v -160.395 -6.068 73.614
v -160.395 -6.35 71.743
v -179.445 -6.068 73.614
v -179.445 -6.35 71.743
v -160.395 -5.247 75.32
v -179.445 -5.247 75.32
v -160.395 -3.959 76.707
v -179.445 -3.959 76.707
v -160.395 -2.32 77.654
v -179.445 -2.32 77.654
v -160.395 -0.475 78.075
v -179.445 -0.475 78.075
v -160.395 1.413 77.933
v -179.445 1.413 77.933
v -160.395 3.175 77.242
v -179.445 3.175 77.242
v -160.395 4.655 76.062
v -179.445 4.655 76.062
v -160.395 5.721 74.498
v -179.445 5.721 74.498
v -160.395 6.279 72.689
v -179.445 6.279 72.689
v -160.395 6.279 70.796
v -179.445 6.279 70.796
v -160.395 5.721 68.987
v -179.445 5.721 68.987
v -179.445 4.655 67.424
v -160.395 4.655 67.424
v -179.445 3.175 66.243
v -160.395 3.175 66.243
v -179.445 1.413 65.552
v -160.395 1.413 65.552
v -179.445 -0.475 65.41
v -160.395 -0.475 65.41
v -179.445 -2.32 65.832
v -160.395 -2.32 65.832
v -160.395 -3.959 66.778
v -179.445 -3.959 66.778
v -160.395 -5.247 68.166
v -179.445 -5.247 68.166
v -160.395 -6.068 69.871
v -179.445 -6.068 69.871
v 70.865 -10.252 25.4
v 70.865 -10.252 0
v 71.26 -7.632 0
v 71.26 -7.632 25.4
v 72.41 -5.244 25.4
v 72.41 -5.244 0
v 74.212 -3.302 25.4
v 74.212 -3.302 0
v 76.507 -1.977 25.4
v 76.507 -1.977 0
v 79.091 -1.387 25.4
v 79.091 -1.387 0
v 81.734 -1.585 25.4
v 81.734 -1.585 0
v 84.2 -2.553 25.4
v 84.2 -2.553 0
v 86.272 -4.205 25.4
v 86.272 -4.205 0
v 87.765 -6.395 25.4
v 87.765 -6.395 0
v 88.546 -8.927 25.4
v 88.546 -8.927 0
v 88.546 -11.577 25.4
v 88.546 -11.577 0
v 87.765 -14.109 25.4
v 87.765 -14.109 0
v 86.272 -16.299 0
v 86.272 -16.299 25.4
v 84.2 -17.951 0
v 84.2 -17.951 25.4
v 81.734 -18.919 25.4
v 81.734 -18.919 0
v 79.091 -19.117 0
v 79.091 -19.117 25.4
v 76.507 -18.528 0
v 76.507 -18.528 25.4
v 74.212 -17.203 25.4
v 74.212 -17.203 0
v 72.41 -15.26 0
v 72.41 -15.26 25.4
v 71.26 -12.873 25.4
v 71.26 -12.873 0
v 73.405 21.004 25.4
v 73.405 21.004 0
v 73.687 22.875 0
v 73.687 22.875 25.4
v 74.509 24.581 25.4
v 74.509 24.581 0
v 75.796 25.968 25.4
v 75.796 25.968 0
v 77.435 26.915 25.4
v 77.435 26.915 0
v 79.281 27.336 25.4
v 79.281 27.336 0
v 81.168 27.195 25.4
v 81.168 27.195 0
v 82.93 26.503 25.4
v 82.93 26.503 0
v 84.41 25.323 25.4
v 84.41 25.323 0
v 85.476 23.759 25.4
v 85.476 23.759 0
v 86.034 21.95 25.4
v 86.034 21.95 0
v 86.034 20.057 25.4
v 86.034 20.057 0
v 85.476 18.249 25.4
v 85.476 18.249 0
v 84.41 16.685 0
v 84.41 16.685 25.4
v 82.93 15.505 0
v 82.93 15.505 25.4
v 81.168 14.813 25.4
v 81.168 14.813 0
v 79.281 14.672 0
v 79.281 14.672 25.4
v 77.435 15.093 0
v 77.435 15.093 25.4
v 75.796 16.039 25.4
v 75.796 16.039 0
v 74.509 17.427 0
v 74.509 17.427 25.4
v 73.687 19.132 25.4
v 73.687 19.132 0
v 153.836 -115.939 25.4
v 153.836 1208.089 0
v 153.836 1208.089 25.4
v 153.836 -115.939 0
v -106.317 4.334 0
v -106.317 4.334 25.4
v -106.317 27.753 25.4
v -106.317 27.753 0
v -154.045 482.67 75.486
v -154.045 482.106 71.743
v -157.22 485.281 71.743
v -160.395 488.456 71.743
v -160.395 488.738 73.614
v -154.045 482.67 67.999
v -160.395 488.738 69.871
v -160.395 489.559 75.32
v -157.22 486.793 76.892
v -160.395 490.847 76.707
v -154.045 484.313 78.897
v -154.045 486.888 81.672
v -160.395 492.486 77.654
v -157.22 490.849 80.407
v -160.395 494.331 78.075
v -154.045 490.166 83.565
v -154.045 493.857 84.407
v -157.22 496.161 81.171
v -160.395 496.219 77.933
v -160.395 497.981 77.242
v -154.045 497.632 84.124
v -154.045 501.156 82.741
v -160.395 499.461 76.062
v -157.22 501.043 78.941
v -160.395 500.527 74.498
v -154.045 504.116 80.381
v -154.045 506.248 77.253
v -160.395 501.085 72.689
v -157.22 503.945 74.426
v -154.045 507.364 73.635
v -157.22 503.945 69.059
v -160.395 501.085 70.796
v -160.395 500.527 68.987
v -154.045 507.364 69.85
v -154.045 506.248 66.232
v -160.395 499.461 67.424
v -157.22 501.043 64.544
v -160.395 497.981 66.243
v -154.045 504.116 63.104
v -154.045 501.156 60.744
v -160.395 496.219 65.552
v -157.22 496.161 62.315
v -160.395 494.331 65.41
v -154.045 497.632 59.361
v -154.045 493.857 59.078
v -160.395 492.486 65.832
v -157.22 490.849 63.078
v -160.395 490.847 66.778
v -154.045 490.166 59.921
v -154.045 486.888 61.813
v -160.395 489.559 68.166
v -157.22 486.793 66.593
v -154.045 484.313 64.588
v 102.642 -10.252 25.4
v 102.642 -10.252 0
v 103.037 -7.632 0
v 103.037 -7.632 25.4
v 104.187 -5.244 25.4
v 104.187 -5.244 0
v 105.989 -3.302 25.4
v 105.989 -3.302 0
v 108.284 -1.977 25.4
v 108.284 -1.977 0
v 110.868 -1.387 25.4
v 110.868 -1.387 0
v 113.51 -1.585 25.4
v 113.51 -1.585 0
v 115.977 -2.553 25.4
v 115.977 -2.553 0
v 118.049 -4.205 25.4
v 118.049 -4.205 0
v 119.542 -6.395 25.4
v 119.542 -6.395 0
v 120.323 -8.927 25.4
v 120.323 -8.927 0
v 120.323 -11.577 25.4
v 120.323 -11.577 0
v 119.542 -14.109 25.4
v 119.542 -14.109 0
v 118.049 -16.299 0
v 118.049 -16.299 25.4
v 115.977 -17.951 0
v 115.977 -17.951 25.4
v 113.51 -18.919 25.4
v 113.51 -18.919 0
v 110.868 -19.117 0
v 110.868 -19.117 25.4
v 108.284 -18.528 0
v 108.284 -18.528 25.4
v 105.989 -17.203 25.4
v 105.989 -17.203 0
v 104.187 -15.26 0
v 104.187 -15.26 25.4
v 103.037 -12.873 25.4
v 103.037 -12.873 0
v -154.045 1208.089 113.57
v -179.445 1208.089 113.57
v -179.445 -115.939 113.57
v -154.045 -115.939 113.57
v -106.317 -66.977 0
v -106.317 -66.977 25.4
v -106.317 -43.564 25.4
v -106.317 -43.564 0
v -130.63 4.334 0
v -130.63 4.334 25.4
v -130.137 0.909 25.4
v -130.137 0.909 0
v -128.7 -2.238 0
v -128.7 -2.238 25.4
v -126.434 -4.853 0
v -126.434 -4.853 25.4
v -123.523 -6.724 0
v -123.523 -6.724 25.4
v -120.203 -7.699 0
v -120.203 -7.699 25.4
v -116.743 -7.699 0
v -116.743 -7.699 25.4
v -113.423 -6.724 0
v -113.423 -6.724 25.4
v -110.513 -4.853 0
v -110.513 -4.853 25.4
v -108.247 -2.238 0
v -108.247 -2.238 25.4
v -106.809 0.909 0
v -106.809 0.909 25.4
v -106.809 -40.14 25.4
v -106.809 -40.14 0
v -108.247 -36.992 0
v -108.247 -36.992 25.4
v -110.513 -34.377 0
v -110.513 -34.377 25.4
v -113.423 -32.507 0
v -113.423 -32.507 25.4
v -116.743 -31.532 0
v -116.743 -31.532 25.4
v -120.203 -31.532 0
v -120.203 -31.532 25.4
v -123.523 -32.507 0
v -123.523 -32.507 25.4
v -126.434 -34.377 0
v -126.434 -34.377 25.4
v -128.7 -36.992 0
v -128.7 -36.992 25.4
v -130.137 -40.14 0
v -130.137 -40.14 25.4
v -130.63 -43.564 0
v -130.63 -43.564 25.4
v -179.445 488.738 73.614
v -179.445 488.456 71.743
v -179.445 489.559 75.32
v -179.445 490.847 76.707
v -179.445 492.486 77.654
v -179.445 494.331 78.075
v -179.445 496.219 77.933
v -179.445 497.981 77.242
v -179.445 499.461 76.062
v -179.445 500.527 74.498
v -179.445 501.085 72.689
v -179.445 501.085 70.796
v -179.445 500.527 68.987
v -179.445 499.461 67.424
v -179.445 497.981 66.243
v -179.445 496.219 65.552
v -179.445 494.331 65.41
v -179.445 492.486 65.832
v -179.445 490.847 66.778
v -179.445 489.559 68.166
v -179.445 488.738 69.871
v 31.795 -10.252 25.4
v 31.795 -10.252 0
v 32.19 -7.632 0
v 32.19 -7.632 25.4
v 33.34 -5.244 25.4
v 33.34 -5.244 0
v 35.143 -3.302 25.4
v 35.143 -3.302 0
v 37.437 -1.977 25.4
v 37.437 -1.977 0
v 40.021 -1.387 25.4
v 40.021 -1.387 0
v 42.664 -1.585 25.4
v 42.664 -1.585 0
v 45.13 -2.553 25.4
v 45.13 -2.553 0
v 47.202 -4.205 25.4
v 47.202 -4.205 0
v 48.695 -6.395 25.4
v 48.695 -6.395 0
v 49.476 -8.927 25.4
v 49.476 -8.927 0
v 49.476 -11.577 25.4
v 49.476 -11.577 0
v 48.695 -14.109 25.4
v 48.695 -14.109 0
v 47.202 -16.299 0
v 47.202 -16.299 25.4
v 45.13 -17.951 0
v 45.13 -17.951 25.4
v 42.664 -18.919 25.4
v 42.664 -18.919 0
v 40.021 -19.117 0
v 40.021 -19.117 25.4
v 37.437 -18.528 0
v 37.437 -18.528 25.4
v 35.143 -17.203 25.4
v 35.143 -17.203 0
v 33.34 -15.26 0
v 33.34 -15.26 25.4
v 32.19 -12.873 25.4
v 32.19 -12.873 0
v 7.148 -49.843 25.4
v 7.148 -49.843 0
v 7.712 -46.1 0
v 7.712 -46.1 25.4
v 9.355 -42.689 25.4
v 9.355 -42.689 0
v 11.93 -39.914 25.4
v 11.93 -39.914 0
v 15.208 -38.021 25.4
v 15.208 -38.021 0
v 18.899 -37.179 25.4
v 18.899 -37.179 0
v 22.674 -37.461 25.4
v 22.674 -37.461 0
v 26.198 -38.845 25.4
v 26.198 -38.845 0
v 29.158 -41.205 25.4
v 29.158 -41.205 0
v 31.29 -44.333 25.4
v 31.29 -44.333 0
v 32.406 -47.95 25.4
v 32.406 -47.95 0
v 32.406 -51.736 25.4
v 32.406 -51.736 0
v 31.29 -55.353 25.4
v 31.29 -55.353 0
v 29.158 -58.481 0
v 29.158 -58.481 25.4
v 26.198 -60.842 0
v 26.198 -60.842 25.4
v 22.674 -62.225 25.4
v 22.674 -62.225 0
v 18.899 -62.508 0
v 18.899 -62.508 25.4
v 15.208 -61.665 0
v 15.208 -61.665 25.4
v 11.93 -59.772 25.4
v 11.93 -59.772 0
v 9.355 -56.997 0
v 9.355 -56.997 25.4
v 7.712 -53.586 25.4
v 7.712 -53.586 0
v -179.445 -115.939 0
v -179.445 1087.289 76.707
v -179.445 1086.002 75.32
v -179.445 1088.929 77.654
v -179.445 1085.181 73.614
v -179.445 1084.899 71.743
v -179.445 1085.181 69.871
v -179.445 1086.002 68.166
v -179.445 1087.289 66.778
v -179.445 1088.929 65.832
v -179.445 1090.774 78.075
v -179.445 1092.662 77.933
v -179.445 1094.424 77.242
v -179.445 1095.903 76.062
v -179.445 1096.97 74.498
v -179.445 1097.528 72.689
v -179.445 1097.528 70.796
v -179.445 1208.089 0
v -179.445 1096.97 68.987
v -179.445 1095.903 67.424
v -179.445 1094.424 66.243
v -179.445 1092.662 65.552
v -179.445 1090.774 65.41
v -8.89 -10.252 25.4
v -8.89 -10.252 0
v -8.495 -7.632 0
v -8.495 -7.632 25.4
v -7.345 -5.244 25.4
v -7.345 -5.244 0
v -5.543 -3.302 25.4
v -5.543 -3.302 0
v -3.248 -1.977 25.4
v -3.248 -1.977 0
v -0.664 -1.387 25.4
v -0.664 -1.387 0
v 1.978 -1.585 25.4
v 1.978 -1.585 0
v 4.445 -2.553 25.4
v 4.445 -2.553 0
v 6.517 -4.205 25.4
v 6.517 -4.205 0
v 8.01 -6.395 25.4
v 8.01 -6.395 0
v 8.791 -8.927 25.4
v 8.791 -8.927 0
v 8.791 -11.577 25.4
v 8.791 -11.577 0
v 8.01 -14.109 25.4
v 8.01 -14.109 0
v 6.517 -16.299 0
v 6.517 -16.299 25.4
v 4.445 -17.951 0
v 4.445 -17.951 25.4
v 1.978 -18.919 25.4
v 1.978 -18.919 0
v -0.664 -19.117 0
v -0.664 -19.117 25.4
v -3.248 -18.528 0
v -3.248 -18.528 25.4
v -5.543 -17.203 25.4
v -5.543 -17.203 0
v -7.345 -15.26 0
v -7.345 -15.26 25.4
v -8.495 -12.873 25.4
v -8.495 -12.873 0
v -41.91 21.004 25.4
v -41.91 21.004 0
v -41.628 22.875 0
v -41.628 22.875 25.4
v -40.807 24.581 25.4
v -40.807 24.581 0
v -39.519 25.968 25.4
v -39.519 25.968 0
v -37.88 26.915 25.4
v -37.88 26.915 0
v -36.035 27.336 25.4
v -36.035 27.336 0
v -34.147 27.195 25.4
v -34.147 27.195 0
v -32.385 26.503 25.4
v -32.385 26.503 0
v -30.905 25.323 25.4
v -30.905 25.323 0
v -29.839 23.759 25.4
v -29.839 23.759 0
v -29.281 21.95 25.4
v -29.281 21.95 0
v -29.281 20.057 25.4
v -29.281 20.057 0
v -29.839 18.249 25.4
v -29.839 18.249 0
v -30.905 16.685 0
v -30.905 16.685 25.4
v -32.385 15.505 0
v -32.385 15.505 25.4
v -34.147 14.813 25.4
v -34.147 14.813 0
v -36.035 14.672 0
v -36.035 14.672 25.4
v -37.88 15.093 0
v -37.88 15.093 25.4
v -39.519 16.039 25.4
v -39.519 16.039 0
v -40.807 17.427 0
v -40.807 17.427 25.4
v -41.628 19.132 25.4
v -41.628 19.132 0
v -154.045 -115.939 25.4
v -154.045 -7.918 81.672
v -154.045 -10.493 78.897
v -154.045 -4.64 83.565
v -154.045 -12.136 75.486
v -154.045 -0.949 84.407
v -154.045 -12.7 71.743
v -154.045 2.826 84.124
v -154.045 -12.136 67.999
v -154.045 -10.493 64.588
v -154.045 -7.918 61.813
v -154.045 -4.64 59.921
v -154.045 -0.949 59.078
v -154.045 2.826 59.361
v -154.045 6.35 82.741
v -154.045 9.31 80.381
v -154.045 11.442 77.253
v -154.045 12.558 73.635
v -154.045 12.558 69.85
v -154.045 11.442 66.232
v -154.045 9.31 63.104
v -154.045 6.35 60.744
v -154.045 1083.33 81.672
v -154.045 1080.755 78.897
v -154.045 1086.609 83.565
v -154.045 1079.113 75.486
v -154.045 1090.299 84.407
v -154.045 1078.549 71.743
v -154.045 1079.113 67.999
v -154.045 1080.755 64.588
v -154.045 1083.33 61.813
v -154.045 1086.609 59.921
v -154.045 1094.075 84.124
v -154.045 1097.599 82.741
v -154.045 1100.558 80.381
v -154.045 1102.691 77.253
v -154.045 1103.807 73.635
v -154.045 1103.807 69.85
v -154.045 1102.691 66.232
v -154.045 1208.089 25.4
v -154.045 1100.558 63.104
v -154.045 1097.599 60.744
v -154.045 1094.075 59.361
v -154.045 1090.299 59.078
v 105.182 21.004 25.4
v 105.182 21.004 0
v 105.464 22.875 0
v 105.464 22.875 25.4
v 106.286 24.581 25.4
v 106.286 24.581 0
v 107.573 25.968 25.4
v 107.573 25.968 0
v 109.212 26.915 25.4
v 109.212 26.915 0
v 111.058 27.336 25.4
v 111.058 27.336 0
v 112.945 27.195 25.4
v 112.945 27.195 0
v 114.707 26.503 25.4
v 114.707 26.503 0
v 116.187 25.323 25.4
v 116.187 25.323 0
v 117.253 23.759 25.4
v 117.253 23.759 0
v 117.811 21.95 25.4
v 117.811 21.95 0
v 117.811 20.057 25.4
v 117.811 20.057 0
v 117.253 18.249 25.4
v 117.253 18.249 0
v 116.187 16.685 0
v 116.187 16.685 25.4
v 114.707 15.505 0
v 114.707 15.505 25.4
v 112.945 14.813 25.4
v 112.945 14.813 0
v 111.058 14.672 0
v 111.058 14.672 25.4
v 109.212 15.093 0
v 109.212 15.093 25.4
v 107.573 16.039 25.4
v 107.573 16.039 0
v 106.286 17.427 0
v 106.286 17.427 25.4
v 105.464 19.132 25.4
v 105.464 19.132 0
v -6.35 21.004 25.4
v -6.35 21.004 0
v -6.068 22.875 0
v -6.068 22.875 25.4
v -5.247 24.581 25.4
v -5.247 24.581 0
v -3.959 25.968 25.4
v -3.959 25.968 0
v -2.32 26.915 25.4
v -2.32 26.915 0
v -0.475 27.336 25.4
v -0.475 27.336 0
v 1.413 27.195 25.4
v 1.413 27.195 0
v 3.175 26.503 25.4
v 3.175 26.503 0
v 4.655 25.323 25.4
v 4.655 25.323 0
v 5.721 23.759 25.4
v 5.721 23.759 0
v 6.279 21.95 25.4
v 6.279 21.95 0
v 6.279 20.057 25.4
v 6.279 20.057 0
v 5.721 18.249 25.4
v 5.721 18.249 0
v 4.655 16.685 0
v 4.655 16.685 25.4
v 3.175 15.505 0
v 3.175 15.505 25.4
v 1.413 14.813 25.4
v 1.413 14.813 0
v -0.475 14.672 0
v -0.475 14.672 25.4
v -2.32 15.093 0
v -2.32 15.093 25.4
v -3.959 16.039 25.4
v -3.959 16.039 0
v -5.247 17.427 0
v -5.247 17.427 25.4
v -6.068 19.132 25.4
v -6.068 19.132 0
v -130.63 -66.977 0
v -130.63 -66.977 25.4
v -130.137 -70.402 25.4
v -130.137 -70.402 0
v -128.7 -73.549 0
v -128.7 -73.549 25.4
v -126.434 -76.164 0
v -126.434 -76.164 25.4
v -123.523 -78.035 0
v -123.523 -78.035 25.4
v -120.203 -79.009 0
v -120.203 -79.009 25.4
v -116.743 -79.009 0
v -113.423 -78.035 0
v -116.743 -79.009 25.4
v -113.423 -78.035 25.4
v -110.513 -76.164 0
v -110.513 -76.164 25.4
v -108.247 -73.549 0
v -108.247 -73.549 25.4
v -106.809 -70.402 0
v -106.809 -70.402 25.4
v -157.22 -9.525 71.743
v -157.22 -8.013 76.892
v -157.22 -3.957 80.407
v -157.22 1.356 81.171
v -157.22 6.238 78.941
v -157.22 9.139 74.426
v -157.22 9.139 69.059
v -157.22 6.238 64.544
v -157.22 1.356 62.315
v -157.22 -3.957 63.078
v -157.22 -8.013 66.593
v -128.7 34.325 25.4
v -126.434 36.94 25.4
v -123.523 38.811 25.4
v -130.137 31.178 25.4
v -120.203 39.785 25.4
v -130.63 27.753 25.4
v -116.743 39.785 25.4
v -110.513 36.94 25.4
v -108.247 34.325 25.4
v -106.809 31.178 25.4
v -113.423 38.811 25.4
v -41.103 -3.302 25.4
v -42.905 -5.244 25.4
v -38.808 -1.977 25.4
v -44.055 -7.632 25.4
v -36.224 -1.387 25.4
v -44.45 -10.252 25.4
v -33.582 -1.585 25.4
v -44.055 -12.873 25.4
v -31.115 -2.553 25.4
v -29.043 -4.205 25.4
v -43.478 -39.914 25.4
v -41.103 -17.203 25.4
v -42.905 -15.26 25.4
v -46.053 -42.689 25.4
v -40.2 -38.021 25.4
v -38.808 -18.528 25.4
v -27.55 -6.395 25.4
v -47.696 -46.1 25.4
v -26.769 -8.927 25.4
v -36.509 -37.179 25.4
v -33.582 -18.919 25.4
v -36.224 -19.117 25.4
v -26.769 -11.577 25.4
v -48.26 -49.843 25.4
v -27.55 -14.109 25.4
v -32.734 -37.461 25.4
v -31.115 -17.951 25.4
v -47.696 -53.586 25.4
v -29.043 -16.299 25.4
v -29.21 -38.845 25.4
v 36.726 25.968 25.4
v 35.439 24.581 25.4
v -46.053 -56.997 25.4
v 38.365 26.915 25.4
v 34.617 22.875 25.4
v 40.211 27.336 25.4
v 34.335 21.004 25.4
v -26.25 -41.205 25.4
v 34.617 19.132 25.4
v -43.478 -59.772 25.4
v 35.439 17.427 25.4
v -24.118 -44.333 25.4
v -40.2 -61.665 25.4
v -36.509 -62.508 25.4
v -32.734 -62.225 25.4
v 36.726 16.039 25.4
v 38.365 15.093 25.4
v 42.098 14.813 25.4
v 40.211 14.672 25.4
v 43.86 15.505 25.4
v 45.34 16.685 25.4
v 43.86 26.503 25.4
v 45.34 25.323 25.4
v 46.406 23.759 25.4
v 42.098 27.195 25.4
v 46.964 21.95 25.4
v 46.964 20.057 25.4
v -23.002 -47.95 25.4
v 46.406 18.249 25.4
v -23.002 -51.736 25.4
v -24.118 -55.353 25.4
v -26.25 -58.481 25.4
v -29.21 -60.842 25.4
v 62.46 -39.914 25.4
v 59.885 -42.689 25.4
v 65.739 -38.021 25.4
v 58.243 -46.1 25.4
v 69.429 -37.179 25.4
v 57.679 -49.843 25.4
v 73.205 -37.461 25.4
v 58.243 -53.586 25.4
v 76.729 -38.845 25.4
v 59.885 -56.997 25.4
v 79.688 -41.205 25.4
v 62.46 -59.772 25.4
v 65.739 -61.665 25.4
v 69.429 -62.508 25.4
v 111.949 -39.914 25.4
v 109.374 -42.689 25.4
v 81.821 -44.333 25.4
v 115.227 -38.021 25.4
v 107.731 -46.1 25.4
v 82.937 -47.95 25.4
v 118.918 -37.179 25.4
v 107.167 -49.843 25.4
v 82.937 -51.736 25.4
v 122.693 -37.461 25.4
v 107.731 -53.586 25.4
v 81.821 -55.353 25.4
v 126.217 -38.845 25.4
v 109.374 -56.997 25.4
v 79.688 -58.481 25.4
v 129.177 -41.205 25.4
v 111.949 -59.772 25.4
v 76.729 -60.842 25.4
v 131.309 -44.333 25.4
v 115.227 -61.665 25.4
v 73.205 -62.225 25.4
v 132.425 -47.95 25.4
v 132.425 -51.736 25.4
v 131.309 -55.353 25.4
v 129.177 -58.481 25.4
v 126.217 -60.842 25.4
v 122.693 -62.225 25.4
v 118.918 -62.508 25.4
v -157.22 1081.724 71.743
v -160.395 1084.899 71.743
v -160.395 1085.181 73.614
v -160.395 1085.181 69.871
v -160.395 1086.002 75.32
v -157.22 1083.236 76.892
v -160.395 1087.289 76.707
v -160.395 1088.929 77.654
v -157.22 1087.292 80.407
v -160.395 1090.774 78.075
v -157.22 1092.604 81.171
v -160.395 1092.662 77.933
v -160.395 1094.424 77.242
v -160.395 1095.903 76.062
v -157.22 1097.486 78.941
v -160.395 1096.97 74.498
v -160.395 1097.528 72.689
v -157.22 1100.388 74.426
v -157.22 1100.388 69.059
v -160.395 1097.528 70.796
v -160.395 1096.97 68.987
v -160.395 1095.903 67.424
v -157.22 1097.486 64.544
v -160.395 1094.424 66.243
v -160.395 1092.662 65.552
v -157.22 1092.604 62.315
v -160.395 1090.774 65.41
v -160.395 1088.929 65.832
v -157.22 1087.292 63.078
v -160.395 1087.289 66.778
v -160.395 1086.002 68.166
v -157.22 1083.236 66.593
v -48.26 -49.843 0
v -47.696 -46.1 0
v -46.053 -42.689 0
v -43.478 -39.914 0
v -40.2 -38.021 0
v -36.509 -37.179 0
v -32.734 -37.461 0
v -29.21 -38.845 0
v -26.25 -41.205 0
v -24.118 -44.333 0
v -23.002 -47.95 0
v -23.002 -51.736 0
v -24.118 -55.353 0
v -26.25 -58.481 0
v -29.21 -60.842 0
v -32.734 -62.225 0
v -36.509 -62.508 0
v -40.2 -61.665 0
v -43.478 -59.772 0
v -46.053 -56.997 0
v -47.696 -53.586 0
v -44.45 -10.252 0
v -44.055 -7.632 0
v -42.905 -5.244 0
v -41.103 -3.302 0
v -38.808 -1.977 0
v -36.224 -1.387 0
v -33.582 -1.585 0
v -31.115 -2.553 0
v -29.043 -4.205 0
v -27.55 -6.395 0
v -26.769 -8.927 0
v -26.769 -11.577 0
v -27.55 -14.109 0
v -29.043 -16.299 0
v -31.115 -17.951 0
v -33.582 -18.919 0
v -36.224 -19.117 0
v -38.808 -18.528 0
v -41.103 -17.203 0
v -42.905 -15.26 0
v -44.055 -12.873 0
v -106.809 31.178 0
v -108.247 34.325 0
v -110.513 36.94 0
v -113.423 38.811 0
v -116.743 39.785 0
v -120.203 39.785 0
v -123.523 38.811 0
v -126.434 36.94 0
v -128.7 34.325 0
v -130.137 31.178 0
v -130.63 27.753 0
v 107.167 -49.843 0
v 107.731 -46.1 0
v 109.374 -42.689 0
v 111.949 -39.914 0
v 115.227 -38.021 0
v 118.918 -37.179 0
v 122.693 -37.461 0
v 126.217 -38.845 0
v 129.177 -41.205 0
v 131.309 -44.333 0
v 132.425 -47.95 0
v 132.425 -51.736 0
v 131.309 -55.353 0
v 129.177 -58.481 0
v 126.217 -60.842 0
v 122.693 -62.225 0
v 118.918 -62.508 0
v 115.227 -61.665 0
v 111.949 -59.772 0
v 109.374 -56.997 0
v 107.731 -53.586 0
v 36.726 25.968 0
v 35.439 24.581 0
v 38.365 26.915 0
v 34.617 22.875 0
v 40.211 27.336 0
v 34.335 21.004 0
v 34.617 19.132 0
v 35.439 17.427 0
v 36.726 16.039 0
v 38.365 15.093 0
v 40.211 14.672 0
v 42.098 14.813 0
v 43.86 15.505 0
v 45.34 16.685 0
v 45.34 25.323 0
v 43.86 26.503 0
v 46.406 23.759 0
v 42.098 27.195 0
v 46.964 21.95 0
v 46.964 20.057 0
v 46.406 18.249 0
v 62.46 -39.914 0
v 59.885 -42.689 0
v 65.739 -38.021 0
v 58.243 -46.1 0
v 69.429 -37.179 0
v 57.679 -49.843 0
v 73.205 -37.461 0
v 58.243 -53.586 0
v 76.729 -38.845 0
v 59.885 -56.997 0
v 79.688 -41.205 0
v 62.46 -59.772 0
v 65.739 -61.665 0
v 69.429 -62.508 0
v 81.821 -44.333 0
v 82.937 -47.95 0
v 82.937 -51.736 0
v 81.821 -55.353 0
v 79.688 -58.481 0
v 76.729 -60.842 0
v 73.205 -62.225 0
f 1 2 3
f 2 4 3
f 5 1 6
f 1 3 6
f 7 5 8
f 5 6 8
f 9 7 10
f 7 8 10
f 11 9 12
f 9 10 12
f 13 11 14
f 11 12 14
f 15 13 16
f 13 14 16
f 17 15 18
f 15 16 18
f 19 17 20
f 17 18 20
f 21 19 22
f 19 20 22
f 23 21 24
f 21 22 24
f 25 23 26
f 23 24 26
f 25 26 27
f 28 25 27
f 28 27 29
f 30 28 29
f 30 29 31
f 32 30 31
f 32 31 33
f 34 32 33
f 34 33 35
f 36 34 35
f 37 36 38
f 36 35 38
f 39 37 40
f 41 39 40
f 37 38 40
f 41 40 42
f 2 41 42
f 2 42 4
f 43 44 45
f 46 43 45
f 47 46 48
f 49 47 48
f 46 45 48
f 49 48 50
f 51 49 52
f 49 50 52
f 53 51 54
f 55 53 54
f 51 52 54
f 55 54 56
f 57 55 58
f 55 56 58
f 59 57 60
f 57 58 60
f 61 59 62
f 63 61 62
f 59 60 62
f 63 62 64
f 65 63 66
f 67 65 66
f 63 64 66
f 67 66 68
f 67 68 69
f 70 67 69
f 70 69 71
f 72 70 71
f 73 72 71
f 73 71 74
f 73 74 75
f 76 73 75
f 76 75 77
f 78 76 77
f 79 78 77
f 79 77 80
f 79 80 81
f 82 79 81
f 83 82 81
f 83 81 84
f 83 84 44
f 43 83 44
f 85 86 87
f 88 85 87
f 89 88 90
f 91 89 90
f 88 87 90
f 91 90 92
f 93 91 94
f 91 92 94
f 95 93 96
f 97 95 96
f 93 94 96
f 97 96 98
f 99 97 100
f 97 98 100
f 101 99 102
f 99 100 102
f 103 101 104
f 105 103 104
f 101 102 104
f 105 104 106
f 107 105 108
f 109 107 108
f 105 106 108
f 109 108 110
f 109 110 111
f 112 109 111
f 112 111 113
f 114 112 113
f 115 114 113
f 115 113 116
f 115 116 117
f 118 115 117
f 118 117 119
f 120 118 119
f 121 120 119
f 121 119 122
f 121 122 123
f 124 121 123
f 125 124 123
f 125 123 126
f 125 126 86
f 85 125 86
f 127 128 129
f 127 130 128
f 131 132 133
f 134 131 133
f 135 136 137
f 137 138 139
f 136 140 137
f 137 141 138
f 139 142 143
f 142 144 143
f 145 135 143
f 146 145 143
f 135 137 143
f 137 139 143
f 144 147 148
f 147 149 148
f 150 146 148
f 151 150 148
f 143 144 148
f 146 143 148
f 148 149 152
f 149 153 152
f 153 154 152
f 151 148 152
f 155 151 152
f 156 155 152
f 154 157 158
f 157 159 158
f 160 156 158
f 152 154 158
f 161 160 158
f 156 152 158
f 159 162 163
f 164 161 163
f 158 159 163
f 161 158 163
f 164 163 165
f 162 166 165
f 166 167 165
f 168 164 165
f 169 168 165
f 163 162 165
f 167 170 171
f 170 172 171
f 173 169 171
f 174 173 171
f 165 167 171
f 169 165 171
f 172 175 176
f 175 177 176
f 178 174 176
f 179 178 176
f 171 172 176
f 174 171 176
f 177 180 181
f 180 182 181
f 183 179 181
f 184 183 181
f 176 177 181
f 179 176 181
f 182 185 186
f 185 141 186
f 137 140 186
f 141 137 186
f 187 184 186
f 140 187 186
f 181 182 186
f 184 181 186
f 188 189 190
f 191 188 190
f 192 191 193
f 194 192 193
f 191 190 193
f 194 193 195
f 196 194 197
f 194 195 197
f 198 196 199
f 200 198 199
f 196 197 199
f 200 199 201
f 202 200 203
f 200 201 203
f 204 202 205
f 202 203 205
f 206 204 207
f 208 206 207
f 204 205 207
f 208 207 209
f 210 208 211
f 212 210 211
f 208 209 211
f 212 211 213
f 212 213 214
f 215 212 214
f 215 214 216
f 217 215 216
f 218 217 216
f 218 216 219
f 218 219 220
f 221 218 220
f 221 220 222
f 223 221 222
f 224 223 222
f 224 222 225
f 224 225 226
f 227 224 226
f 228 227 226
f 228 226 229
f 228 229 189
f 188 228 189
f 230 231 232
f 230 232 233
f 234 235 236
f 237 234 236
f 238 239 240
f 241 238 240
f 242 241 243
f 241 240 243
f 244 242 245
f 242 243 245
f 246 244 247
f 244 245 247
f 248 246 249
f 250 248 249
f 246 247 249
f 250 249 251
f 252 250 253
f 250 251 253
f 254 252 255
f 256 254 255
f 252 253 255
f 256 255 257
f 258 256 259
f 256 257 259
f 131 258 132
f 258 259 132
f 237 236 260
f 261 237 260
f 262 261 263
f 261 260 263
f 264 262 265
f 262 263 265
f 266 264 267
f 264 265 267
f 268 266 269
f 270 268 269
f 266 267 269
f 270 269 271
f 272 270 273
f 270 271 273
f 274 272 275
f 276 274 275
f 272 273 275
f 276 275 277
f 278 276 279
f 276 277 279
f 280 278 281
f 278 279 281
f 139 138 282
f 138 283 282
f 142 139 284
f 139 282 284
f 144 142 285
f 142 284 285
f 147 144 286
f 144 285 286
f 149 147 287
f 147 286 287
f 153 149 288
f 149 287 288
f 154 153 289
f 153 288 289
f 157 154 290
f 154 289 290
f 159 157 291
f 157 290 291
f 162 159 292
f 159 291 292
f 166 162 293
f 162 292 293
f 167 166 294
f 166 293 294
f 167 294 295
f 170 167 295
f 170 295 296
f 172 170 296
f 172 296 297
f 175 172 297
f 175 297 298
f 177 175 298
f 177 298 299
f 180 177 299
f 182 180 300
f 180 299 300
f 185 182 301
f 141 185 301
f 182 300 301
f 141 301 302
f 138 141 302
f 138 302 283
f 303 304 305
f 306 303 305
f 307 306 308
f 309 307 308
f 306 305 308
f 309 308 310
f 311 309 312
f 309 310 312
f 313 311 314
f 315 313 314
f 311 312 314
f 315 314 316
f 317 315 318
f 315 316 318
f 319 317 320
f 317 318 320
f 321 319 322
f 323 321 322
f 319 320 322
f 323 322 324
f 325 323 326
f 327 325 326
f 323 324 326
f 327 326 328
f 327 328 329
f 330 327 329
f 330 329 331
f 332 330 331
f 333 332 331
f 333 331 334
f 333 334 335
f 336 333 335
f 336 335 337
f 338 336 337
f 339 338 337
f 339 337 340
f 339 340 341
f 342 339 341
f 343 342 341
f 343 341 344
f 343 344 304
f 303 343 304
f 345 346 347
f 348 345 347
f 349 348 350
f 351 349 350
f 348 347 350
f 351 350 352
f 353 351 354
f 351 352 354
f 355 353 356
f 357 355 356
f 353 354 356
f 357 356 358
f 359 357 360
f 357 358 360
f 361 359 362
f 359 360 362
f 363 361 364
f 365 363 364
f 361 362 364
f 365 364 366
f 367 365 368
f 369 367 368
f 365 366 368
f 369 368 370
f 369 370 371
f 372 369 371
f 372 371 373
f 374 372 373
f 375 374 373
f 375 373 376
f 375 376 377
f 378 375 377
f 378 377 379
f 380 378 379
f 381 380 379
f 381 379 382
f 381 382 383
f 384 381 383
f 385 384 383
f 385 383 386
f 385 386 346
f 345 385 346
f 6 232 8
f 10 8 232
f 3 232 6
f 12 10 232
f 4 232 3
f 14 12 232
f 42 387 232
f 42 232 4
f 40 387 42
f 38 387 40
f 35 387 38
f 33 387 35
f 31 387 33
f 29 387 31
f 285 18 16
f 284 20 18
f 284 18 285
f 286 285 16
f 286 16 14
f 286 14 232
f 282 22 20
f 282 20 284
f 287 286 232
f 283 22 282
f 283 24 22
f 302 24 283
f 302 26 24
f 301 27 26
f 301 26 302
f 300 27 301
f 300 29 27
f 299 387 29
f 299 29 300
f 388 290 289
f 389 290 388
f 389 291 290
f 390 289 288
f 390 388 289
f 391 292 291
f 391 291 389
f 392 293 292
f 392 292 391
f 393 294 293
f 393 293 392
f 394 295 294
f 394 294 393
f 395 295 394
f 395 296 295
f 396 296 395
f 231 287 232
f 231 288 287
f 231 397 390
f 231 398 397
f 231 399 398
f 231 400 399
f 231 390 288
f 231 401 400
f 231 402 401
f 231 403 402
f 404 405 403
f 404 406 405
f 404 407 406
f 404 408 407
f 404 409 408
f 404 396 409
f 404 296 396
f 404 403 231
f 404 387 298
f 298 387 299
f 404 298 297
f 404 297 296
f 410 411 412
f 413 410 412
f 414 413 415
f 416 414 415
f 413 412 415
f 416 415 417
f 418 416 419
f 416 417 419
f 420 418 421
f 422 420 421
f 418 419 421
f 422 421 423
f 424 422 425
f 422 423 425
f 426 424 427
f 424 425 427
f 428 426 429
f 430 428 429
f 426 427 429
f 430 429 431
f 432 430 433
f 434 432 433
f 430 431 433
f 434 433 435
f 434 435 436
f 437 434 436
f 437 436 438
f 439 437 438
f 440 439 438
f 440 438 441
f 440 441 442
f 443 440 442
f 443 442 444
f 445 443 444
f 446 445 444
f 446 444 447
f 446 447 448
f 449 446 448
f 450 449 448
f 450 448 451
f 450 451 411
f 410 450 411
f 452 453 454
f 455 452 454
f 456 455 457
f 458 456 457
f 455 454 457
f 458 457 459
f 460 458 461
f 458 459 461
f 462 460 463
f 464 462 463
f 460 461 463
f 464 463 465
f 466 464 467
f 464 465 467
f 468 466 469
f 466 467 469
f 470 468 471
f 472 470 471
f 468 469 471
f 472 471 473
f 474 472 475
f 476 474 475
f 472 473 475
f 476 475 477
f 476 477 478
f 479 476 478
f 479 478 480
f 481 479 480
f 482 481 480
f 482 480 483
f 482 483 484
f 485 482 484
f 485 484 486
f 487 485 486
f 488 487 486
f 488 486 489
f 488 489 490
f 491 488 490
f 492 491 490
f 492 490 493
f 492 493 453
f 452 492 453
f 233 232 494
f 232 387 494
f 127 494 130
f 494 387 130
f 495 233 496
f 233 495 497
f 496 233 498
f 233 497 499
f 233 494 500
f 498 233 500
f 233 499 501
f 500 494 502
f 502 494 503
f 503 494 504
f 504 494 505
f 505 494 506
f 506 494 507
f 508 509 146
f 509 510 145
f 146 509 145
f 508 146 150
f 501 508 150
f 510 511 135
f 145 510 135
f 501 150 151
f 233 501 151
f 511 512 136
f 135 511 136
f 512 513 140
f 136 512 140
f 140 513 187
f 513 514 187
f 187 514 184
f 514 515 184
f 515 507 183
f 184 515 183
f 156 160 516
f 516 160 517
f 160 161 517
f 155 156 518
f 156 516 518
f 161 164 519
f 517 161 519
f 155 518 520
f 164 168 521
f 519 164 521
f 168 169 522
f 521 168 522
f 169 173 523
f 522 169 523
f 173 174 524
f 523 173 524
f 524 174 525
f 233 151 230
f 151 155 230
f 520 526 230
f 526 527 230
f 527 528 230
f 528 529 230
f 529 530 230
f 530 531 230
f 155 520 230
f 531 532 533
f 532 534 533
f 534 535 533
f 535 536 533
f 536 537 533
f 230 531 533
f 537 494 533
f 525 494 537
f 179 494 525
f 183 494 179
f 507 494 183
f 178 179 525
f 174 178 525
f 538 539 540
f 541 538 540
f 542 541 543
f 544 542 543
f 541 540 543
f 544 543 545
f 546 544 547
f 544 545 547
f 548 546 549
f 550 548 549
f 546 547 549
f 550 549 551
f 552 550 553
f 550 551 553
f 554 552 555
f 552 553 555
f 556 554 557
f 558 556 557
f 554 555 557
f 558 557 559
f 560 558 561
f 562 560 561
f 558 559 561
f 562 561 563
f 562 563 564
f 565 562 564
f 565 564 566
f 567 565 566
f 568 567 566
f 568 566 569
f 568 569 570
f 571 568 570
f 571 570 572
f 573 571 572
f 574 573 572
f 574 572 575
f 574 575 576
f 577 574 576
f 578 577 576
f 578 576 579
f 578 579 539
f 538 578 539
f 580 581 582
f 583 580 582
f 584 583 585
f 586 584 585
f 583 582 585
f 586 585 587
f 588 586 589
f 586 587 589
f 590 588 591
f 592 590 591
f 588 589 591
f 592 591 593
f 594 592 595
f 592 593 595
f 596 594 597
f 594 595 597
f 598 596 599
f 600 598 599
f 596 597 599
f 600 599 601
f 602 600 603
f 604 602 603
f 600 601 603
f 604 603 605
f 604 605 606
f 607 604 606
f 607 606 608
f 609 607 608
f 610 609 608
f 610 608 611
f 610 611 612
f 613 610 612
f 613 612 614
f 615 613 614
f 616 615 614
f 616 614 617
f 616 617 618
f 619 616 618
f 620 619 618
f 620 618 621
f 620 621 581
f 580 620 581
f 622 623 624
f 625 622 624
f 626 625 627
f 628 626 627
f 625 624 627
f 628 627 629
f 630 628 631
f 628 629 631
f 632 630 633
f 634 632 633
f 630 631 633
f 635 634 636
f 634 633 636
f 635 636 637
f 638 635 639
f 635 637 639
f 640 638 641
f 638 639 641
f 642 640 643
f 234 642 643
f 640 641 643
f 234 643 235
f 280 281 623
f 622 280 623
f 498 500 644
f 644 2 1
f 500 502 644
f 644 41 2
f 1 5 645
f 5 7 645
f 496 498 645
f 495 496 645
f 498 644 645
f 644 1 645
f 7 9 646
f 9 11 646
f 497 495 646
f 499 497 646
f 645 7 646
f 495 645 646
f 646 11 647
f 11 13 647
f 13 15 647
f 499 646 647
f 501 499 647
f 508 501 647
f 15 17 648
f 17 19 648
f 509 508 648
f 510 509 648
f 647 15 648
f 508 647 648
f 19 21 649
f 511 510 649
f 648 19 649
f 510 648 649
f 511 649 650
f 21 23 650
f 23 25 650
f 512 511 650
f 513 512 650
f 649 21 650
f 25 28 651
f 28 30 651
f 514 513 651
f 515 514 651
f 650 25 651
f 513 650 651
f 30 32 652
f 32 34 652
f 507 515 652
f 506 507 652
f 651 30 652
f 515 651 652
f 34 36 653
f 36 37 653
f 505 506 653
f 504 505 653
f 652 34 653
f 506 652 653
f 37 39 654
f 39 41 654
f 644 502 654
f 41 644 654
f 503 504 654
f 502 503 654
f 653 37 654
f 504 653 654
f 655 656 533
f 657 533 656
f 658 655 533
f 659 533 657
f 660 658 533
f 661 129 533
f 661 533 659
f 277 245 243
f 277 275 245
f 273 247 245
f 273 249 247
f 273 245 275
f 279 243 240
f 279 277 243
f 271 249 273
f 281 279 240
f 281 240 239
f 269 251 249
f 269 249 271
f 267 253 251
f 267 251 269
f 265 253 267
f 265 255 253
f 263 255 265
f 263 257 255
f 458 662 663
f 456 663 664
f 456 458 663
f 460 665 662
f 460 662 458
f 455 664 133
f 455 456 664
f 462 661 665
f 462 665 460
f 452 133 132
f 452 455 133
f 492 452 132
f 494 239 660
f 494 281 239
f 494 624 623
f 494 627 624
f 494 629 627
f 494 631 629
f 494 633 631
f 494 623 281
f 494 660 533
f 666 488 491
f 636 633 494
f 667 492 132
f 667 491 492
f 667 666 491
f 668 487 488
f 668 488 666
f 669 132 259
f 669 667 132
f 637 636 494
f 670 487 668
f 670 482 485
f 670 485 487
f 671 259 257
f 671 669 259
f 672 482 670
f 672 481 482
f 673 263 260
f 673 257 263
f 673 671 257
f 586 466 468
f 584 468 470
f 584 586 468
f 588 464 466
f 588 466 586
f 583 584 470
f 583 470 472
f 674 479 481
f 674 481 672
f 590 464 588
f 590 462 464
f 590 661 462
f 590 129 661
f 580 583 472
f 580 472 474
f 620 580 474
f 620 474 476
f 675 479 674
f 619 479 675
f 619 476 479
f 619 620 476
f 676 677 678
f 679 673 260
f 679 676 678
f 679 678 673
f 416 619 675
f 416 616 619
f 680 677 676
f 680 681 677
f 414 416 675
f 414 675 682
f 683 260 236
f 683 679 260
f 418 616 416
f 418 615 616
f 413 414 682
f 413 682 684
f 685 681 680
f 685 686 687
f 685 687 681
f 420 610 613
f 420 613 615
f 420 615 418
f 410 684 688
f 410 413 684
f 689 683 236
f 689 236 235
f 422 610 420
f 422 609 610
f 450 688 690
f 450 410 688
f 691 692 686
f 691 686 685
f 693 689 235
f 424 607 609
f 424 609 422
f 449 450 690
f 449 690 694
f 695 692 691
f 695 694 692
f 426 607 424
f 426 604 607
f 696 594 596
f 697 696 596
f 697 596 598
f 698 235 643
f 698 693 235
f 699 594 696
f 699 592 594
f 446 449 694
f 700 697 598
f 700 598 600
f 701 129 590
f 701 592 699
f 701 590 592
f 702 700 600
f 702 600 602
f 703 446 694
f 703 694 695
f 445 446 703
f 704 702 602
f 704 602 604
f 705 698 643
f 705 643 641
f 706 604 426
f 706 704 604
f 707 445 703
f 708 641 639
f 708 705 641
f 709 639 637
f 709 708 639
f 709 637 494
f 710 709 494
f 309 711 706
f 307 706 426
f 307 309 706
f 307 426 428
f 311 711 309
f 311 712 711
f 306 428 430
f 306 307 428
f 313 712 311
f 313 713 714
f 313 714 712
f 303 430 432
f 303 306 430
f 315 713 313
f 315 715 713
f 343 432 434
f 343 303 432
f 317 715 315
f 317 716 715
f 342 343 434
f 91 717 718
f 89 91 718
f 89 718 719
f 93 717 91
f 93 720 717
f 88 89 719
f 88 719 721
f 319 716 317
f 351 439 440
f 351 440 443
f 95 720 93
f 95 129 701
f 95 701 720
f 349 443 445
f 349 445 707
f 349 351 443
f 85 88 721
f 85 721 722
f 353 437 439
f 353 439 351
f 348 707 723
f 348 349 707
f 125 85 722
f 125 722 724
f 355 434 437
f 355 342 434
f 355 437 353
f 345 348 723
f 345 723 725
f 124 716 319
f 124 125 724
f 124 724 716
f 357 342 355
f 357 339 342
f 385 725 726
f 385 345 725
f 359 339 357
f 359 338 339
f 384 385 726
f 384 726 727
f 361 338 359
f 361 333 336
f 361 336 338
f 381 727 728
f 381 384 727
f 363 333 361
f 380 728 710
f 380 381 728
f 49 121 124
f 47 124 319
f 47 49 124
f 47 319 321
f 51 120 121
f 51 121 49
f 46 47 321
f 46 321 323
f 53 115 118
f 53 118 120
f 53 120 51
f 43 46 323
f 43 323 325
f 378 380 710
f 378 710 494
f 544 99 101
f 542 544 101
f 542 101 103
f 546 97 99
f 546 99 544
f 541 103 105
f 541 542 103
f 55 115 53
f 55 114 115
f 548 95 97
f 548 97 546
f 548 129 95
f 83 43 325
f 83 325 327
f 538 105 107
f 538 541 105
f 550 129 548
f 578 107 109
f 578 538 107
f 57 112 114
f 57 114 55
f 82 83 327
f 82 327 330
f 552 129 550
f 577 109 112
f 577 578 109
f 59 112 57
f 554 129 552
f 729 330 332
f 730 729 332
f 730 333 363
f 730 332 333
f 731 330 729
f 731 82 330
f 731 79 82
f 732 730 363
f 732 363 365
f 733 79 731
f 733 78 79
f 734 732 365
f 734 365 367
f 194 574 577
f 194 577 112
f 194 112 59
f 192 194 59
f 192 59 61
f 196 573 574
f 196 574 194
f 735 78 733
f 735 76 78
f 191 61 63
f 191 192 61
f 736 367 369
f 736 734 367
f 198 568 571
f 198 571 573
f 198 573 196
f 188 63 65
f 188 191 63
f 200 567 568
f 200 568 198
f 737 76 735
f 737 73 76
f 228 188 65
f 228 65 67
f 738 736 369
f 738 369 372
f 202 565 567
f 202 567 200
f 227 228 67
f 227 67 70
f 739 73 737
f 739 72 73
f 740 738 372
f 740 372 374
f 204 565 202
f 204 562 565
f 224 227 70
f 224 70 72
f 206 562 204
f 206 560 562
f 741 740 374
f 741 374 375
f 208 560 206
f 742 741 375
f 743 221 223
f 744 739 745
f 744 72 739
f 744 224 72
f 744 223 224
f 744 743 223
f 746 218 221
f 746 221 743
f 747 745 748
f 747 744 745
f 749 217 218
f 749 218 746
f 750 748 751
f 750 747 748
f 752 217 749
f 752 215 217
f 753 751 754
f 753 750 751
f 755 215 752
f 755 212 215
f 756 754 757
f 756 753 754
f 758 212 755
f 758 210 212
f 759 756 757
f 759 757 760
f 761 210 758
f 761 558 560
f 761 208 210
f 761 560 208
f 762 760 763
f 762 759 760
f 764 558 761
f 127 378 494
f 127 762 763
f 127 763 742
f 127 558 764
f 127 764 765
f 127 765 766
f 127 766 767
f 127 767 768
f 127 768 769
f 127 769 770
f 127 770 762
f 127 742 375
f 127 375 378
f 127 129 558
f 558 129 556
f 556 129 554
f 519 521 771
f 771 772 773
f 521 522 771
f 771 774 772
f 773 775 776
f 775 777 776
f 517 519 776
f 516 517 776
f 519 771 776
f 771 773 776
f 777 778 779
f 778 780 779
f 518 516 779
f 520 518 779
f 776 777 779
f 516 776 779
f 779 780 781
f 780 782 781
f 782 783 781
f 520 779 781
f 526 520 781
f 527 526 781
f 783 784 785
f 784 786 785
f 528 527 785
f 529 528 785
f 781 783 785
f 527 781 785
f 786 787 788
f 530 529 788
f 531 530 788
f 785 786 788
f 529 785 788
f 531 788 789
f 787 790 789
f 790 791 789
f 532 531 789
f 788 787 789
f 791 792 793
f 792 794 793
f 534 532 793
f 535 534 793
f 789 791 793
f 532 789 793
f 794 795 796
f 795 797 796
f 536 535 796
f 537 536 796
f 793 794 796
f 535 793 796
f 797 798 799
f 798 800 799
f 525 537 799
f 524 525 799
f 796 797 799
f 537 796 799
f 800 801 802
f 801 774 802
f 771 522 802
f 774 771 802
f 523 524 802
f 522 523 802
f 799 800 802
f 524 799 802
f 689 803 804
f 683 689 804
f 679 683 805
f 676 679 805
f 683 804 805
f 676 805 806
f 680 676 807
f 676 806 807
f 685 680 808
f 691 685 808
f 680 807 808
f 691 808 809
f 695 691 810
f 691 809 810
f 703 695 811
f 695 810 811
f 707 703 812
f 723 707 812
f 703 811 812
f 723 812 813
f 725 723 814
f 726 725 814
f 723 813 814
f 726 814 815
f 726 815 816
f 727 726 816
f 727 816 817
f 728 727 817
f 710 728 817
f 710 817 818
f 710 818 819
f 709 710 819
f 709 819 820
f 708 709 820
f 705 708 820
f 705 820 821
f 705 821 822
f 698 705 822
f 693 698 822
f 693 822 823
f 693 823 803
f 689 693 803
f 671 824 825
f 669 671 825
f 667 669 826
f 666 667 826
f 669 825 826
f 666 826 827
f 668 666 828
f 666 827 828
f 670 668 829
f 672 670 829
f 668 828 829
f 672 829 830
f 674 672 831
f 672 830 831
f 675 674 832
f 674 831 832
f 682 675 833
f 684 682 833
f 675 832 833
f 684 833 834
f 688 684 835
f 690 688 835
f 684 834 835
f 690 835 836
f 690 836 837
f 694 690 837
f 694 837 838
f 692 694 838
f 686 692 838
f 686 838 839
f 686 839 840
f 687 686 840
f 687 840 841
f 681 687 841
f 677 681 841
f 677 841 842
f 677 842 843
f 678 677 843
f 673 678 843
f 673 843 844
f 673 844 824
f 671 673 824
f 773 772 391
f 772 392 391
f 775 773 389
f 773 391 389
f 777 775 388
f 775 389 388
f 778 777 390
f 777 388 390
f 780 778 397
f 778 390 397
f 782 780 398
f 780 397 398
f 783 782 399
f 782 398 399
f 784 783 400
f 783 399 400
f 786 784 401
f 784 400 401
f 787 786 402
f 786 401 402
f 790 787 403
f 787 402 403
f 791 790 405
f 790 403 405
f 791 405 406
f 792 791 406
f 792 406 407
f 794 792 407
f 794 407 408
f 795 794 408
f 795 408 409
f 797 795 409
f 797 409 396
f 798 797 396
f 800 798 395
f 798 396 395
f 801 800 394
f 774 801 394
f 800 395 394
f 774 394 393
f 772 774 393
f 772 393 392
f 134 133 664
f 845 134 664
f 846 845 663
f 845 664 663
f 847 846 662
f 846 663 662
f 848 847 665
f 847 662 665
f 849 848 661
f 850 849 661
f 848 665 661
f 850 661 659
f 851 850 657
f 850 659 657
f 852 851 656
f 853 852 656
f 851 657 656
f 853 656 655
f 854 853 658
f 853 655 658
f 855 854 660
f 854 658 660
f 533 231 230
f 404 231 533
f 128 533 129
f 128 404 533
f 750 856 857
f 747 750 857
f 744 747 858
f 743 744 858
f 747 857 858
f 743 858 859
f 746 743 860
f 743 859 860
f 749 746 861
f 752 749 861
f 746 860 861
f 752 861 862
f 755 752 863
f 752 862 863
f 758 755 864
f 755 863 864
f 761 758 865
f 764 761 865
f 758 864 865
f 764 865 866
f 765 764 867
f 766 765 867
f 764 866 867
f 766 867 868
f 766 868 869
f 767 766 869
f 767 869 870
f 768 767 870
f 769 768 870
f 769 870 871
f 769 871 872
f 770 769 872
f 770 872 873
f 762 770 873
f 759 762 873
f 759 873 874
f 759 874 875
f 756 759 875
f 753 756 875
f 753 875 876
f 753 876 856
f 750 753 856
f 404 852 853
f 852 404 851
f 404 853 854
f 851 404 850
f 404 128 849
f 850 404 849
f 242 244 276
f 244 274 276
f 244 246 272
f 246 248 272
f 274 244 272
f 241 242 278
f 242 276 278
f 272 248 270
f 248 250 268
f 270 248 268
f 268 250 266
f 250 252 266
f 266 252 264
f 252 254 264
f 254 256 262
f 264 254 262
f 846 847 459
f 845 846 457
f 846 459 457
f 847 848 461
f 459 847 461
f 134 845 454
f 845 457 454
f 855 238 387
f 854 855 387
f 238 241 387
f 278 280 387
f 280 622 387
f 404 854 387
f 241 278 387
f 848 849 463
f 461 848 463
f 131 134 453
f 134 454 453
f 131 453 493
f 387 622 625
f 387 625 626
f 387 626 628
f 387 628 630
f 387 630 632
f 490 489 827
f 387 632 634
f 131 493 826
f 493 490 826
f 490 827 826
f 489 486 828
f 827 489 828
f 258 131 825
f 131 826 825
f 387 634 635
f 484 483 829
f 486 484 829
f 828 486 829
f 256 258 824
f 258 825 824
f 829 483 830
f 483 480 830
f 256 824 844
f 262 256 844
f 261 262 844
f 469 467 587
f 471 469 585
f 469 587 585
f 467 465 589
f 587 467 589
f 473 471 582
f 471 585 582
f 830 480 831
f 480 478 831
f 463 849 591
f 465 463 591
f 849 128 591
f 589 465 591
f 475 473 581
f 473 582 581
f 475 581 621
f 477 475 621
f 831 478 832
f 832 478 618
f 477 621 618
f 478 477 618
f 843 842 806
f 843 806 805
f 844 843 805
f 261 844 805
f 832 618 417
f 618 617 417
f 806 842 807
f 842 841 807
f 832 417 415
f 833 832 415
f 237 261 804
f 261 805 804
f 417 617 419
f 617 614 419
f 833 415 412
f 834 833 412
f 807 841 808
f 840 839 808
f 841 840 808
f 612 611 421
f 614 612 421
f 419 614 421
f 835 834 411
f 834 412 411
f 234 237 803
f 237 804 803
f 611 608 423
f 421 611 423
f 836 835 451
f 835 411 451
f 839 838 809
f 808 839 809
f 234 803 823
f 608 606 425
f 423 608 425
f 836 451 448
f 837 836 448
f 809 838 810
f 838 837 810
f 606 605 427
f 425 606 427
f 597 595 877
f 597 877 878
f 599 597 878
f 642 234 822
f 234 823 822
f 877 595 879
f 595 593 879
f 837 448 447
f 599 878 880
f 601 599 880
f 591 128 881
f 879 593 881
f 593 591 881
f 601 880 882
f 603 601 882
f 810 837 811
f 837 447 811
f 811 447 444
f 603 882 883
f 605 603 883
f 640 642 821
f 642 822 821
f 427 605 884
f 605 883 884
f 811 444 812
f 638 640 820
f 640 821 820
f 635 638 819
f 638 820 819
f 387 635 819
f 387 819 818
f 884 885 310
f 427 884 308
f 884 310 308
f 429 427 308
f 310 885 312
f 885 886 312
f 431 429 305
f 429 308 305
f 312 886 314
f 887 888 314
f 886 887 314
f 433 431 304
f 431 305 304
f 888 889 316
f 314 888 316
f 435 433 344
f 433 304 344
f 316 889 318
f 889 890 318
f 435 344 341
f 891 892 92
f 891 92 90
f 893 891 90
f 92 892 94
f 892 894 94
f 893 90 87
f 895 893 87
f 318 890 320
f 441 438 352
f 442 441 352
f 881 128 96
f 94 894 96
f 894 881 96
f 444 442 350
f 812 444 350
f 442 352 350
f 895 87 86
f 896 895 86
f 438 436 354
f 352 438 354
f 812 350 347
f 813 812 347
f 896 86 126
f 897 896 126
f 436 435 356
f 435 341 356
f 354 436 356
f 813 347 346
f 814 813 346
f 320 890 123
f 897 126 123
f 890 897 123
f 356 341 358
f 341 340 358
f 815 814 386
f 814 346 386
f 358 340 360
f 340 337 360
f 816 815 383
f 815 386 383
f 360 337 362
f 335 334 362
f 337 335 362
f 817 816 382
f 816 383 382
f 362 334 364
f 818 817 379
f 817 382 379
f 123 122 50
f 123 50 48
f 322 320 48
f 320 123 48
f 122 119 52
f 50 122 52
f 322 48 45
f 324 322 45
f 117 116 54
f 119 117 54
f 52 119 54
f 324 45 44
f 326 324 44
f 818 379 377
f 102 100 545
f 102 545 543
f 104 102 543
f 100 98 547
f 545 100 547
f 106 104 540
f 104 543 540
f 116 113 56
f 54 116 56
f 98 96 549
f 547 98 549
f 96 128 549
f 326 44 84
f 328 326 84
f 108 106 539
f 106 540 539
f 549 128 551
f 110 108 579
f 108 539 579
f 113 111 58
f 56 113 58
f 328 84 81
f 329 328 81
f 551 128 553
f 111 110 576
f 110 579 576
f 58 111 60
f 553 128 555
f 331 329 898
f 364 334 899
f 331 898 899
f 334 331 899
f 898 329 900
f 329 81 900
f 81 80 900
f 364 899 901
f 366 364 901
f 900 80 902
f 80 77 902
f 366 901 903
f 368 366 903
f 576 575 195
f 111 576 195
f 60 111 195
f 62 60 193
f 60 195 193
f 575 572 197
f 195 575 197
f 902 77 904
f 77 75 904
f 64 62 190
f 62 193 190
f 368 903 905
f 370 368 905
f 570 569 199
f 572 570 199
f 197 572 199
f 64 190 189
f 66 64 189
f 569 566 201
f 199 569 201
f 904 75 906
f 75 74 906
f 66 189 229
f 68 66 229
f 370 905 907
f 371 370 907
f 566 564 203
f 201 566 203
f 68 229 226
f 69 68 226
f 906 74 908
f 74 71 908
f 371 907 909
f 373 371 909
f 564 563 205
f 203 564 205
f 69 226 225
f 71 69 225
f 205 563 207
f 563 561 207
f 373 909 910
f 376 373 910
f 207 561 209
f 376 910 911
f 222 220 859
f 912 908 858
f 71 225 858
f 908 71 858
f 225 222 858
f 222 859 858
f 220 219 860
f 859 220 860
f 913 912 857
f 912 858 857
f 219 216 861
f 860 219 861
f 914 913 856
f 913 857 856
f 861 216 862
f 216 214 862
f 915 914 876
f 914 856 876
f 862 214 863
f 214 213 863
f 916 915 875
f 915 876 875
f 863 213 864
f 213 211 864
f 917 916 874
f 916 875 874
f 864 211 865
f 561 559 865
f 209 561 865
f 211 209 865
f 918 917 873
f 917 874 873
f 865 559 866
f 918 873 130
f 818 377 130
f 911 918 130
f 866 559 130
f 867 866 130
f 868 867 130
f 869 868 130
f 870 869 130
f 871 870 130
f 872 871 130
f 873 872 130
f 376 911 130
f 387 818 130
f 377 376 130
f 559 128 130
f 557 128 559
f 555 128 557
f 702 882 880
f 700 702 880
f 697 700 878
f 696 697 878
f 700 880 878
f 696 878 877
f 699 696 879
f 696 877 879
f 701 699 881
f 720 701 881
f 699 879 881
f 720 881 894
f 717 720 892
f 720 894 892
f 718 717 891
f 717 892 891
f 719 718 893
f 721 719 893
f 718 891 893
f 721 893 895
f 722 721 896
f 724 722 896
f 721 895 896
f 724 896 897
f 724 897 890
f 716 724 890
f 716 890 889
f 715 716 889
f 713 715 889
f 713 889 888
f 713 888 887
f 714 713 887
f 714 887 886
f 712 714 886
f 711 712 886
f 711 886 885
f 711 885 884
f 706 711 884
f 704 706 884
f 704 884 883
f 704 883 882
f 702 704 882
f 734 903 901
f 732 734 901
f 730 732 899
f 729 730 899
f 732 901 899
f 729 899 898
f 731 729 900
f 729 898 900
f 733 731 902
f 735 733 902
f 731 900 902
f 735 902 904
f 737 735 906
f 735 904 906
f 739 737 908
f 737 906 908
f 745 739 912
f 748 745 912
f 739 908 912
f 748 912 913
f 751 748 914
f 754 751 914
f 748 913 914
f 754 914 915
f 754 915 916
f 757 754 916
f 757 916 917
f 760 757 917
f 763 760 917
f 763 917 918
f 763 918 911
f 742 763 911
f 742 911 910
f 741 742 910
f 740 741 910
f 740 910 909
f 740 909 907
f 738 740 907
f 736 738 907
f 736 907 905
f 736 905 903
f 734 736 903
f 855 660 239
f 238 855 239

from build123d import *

# Parameters (mm, degrees)
F0_W            = 307.8816831112
F0_H            = 200.2553716302
F1_DEPTH        = 25.4
F2_W            = 307.8816831112
F2_H            = 25.4
F3_DEPTH        = 174.76264
F4_DEPTH        = 949.00905
F5_W            = 1324.0270616302
F5_H            = 25.4
F6_DEPTH        = 25.4
F7_W            = 25.4
F7_H            = 1324.0270616302
F8_DEPTH        = 88.17008
F10_D           = 12.7
F10_CSINK_D     = 25.4
F10_CSINK_ANGLE = 90
F12_D           = 12.7
F13_D           = 17.78
F14_D           = 25.4
F15_DEPTH       = 25.4


with BuildPart() as f1:
    # F0 (on Top) → F1 (new body)
    with BuildSketch(Plane.XY):
        with Locations((-0.1046210527, -15.8108584583)):
            Rectangle(F0_W, F0_H)
    extrude(amount=F1_DEPTH)

    # F2 (on face) → F3 (join)
    with BuildSketch(Plane(origin=(0, 84.3168273568, 0), x_dir=(-1, 0, 0), z_dir=(0, 1, 0))):
        with Locations((0.1046210527, 12.7)):
            Rectangle(F2_W, F2_H)
    extrude(amount=F3_DEPTH)

    # F4 (add): a face of the model
    f4_faces = [f1.faces().sort_by_distance(p)[0] for p in [
        (-0.1046210527, 259.0794673568, 12.7),
    ]]
    extrude(f4_faces, amount=F4_DEPTH)

    # F5 (on face) → F6 (join)
    with BuildSketch(Plane(origin=(-154.0454626083, 0, 0), x_dir=(0, -1, 0), z_dir=(-1, 0, 0))):
        with Locations((-546.0749865417, 12.7)):
            Rectangle(F5_W, F5_H)
    extrude(amount=F6_DEPTH)

    # F7 (on face) → F8 (join)
    with BuildSketch(Plane.XY.offset(25.4)):
        with Locations((-166.7454626083, 546.0749865417)):
            Rectangle(F7_W, F7_H)
    extrude(amount=F8_DEPTH)

    # F10 (through all)
    with Locations(Plane.YZ.offset(-154.0454626083)):
        with Locations((0, 71.7426463962), (494.805842638, 71.7426463962), (1091.2485173568, 71.7426463962)):
            CounterSinkHole(F10_D / 2, F10_CSINK_D / 2, counter_sink_angle=F10_CSINK_ANGLE)

    # F12 (through all)
    with Locations(Plane.XY.offset(25.4)):
        with Locations((-35.56, 21.0037976503), (0, 21.0037976503), (40.685325861, 21.0037976503), (79.7552913427, 21.0037976503), (111.532188952, 21.0037976503)):
            Hole(F12_D / 2)

    # F13 (through all)
    with Locations(Plane.XY.offset(25.4)):
        with Locations((-35.56, -10.2521730587), (0, -10.2521730587), (40.685325861, -10.2521730587), (79.7552913427, -10.2521730587), (111.532188952, -10.2521730587)):
            Hole(F13_D / 2)

    # F14 (through all)
    with Locations(Plane.XY.offset(25.4)):
        with Locations((-35.56, -49.8430728912), (19.8480077088, -49.8430728912), (70.3785046935, -49.8430728912), (119.8671087623, -49.8430728912)):
            Hole(F14_D / 2)

    # F11 (on face) → F15 (cut)
    with BuildSketch(Plane.XY.offset(25.4)):
        with BuildLine():
            Line((-130.6297034025, 27.7527463882), (-130.6297034025, 4.3339463882))
            ThreePointArc((-130.6297034025, 4.3339463882), (-118.4733323753, -7.822424639), (-106.3169613481, 4.3339463882))
            Line((-106.3169613481, 4.3339463882), (-106.3169613481, 27.7527463882))
            ThreePointArc((-106.3169613481, 27.7527463882), (-118.4733323753, 39.9091174154), (-130.6297034025, 27.7527463882))
        make_face()
        with BuildLine():
            ThreePointArc((-106.3169613481, -43.5644686222), (-118.4733323753, -31.408097595), (-130.6297034025, -43.5644686222))
            Line((-130.6297034025, -43.5644686222), (-130.6297034025, -63.3748397231))
            Line((-130.6297034025, -63.3748397231), (-130.6297034025, -66.9767335057))
            ThreePointArc((-130.6297034025, -66.9767335057), (-118.4733323753, -79.133104533), (-106.3169613481, -66.9767335057))
            Line((-106.3169613481, -66.9767335057), (-106.3169613481, -43.5644686222))
        make_face()
    extrude(amount=-F15_DEPTH, mode=Mode.SUBTRACT)


solid = f1.part
